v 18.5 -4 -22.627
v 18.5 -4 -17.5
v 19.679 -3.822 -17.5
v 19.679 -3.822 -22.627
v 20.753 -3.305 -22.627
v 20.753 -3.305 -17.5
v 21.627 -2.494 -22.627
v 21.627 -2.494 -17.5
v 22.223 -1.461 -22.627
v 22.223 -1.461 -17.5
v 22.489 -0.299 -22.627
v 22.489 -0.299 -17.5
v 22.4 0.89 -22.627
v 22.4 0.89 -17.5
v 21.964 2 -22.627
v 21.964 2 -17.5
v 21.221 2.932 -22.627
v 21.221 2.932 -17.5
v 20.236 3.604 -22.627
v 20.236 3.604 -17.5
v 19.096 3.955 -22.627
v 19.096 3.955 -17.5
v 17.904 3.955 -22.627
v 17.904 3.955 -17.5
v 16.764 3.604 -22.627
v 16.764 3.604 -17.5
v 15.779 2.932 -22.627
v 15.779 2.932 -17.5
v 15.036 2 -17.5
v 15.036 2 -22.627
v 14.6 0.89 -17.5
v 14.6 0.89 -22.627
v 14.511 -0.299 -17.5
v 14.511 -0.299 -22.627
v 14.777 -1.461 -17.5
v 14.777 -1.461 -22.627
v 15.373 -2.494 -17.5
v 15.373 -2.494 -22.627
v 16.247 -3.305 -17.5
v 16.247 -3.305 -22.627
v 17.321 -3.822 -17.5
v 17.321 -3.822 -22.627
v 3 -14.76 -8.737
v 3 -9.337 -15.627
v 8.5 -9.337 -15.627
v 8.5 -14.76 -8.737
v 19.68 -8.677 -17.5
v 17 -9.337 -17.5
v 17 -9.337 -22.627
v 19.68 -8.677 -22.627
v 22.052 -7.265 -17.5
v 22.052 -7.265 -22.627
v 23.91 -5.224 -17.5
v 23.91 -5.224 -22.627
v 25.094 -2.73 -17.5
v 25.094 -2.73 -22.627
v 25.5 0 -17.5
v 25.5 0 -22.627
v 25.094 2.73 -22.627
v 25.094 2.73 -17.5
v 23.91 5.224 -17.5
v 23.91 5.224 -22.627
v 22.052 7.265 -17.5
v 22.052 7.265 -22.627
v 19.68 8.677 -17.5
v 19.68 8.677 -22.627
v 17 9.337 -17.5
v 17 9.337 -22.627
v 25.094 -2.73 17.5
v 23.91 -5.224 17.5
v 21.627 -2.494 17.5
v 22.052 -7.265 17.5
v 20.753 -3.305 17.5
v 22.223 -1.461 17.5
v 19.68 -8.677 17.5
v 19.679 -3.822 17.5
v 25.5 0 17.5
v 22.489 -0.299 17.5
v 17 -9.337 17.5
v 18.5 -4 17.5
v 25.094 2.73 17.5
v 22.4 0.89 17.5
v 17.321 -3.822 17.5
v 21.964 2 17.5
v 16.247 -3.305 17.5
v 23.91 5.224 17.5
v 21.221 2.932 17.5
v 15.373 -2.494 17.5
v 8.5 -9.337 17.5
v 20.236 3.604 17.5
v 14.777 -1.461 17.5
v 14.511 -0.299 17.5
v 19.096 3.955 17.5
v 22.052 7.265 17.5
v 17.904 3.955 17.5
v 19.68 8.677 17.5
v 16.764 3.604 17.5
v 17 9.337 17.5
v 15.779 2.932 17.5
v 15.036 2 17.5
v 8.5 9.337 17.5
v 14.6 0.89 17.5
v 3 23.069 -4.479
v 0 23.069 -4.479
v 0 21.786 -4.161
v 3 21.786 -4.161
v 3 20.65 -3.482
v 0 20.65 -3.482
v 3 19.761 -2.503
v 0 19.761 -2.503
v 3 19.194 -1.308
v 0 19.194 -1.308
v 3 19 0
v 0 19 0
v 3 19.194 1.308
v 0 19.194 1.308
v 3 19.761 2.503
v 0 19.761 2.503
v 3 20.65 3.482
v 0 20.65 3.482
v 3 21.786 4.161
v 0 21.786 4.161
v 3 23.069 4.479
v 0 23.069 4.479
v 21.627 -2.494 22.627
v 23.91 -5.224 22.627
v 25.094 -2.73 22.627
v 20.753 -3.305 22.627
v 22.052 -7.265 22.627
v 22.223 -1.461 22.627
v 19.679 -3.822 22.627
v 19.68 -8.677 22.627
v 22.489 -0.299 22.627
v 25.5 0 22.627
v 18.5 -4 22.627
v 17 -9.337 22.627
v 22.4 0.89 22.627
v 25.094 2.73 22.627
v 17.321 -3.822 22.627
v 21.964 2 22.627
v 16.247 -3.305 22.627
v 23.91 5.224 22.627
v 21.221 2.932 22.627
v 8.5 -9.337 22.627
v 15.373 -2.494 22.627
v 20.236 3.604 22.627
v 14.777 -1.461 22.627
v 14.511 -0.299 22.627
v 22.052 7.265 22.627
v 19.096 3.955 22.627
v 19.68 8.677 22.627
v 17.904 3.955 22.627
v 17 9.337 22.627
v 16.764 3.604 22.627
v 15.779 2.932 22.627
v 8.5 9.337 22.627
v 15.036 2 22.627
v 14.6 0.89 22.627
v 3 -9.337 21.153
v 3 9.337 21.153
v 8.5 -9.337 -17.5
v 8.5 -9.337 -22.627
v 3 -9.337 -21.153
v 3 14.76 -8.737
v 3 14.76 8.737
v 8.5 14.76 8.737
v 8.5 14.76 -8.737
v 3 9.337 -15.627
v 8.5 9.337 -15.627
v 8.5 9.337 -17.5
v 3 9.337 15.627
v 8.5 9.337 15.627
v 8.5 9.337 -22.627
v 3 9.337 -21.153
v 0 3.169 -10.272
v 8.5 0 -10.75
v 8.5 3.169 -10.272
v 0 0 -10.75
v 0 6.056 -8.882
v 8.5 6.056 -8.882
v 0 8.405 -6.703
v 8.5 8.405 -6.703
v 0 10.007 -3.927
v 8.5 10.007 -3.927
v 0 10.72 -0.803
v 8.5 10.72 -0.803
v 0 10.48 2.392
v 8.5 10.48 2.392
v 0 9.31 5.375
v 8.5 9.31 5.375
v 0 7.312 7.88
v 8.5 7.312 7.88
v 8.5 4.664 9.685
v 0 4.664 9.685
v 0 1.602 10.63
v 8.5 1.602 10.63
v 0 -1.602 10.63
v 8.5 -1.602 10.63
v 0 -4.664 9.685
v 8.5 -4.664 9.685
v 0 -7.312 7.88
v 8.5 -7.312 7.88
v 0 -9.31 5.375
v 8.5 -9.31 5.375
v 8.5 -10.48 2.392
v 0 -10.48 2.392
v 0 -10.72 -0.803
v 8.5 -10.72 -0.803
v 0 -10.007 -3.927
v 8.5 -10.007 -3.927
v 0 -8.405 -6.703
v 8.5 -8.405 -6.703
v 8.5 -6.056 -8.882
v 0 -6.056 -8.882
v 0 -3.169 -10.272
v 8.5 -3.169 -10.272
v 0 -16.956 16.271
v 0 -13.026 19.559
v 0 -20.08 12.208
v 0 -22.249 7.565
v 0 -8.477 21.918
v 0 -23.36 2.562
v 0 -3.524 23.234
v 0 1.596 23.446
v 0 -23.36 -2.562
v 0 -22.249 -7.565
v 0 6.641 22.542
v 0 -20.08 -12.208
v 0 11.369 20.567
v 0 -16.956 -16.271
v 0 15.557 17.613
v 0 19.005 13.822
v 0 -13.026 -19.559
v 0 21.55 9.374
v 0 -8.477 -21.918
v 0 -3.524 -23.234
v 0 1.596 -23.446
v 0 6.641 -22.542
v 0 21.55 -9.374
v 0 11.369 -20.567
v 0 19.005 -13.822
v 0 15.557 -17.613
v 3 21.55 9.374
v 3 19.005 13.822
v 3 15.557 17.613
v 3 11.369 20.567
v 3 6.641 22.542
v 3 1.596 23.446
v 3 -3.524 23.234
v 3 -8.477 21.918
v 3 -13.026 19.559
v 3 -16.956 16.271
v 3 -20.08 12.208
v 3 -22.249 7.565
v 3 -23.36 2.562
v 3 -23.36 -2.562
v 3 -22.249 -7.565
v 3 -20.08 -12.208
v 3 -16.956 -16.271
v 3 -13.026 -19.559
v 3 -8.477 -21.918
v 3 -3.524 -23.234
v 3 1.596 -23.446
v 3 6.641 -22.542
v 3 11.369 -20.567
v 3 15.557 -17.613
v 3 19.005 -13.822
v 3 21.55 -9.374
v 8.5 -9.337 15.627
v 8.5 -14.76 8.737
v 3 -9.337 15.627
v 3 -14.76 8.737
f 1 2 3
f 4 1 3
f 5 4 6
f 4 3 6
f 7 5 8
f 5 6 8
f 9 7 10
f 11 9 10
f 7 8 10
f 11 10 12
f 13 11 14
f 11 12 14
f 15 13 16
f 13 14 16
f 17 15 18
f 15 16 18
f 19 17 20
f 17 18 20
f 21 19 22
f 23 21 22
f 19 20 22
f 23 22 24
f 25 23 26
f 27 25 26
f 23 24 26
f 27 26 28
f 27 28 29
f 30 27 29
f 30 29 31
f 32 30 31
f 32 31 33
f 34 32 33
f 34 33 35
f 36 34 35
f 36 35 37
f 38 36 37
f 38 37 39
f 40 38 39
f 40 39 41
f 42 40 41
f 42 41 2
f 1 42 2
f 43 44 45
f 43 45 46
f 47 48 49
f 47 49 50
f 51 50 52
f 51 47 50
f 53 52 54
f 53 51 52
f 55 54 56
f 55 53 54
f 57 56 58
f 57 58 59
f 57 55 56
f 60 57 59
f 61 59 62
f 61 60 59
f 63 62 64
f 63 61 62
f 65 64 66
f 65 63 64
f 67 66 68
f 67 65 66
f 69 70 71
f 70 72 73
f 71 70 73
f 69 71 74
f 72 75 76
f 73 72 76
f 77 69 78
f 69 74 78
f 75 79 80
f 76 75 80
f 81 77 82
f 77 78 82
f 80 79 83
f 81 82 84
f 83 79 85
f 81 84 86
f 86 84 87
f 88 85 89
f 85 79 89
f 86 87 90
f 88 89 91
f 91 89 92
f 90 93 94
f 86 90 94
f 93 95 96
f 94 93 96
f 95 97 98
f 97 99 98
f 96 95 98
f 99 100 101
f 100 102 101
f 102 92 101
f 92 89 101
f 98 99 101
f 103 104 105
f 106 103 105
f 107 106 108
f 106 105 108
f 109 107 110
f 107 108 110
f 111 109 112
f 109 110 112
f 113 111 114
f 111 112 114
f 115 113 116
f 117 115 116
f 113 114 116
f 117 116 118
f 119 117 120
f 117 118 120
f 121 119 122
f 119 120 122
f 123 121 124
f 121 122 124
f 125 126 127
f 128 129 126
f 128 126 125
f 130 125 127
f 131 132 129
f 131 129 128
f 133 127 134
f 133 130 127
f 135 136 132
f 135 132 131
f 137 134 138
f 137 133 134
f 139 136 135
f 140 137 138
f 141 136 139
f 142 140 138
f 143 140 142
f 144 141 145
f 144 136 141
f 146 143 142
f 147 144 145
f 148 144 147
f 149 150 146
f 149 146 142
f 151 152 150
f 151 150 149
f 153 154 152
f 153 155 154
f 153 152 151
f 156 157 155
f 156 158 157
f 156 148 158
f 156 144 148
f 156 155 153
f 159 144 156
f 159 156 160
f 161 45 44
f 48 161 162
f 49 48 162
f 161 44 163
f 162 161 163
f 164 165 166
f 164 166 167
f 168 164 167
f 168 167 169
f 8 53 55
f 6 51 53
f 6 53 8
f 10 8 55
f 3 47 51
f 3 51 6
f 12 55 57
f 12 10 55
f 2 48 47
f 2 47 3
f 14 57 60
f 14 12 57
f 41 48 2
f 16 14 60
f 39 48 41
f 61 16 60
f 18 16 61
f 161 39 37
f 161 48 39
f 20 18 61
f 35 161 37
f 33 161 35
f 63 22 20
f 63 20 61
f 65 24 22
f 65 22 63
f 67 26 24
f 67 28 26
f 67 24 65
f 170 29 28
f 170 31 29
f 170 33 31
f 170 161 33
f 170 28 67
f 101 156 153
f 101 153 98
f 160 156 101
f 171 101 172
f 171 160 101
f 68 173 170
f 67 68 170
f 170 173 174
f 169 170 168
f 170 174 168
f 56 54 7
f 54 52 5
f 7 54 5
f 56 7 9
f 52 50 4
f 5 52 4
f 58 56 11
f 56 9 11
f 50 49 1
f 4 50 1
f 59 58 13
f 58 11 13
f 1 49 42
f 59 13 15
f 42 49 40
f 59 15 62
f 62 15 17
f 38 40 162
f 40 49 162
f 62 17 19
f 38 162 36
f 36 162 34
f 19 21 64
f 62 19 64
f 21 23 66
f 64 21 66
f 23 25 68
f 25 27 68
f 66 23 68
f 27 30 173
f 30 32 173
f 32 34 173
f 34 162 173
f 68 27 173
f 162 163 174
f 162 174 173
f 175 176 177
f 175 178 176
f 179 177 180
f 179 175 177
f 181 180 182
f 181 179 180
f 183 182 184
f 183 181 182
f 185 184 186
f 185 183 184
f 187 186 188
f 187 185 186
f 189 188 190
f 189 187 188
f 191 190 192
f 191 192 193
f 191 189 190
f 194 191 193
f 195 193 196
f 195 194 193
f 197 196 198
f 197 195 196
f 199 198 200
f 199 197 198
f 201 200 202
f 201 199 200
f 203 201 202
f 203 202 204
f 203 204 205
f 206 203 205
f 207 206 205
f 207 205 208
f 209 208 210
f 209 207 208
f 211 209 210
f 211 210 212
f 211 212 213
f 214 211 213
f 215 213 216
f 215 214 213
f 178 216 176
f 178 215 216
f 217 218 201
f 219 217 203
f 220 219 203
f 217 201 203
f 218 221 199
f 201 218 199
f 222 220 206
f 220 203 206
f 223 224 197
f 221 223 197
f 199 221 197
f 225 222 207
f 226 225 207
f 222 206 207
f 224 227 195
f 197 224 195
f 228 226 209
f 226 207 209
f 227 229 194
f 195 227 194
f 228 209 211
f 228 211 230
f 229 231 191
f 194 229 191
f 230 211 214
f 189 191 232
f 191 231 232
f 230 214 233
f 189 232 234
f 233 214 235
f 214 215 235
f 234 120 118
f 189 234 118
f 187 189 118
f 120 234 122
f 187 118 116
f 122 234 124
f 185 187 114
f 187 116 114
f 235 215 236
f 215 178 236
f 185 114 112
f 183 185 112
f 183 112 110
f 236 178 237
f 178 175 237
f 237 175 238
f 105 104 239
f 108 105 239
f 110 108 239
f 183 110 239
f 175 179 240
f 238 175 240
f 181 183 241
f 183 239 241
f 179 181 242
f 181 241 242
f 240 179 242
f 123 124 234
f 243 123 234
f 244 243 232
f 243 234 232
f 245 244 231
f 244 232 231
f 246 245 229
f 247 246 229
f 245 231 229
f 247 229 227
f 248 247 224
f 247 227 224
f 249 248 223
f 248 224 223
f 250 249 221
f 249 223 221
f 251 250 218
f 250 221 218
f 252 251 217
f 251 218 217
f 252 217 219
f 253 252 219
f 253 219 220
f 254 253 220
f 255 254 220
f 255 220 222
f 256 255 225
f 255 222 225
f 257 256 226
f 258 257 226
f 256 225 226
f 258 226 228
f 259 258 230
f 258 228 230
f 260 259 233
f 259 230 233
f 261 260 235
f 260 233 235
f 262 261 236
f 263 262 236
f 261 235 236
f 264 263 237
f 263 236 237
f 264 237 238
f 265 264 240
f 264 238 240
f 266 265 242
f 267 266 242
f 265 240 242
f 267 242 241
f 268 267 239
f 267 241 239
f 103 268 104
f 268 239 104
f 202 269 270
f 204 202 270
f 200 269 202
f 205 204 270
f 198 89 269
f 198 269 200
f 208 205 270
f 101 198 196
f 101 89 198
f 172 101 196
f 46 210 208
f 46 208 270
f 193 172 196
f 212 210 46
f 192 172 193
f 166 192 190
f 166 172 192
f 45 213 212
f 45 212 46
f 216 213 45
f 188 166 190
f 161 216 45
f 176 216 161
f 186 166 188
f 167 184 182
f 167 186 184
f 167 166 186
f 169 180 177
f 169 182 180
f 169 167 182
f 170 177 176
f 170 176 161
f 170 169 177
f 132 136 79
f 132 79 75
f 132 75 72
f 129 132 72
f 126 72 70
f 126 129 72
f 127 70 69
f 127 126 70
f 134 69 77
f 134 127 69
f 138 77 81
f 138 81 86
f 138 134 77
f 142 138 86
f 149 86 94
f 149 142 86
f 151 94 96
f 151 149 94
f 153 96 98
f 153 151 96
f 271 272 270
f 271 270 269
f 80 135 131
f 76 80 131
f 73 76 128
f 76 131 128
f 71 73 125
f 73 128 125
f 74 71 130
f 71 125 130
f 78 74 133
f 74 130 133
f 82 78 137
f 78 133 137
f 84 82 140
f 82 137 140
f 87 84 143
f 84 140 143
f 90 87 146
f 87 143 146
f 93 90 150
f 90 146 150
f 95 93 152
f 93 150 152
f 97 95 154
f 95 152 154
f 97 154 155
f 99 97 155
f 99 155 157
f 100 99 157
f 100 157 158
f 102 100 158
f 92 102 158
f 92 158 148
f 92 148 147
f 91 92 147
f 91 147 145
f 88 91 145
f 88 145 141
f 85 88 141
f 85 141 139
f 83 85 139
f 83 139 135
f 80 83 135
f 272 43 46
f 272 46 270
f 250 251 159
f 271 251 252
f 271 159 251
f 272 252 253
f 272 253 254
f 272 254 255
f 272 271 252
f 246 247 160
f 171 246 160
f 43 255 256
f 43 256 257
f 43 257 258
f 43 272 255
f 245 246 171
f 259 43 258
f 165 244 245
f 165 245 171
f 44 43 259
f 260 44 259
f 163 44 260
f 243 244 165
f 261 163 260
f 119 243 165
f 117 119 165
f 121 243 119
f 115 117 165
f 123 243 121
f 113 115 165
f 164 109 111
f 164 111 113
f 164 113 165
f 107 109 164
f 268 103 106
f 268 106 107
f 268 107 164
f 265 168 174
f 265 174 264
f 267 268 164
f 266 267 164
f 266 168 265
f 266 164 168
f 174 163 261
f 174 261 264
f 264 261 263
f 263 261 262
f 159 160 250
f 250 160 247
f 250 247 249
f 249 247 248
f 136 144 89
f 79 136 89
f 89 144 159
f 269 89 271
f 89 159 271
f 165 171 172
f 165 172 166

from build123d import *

# Parameters (mm, degrees)
SKETCH1_R           = 10.75
BOSS_EXTRUDE1_DEPTH = 3
SKETCH2_R           = 10.75
BOSS_EXTRUDE2_DEPTH = 5.5
DRAFT5_START        = -9.337185289
DRAFT5_DEPTH        = 18.674370578
SKETCH3_W           = 5.126913696
SKETCH3_H           = 18.674370578
BOSS_EXTRUDE3_DEPTH = 17
CUT_EXTRUDE1_REACH  = 59.708
CUT_EXTRUDE2_REACH  = 59.708
SKETCH5_R           = 4


# Read off the part's stored shape, not the designer's step: Draft5
with BuildPart() as part:
    # Sketch1 → Boss-Extrude1 (new body)
    with BuildSketch(Plane(origin=(0, 0, 0), x_dir=(0, 0, -1), z_dir=(1, 0, 0))):
        with BuildLine():
            ThreePointArc((-4.479326664, 23.069148936), (0, -23.5), (4.479326664, 23.069148936))
            ThreePointArc((4.479326664, 23.069148936), (0, 19), (-4.479326664, 23.069148936))
        make_face()
        Circle(SKETCH1_R, mode=Mode.SUBTRACT)
    extrude(amount=BOSS_EXTRUDE1_DEPTH)

    # Sketch2 → Boss-Extrude2 (add)
    # profile 1 of 7: a face of its own
    with BuildSketch(Plane(origin=(3, 0, 0), x_dir=(0, 0, -1), z_dir=(1, 0, 0))):
        with BuildLine():
            Line((-15.626913696, -9.337185289), (-15.626913696, 9.337185289))
            Line((-15.626913696, 9.337185289), (-21.565411447, 9.337185289))
            ThreePointArc((-21.565411447, 9.337185289), (-22.146716975, 7.859575512), (-22.626913696, 6.346083564))
            Line((-22.626913696, 6.346083564), (-22.626913696, -6.346083564))
            ThreePointArc((-22.626913696, -6.346083564), (-22.146716975, -7.859575512), (-21.565411447, -9.337185289))
            Line((-21.565411447, -9.337185289), (-15.626913696, -9.337185289))
        make_face()
    # profile 2 of 7: a face of its own
    with BuildSketch(Plane(origin=(3, 0, 0), x_dir=(0, 0, -1), z_dir=(1, 0, 0))):
        Polygon((-15.626913696, -9.337185289), (-15.626913696, 9.337185289), (-8.736803998, 14.760144229), (8.736803998, 14.760144229), (15.626913696, 9.337185289), (15.626913696, -9.337185289), (8.736803998, -14.760144229), (-8.736803998, -14.760144229), align=None)
        Circle(SKETCH2_R, mode=Mode.SUBTRACT)
    # profile 3 of 7: a face of its own
    with BuildSketch(Plane(origin=(3, 0, 0), x_dir=(0, 0, -1), z_dir=(1, 0, 0))):
        with BuildLine():
            Line((21.565411447, 9.337185289), (15.626913696, 9.337185289))
            Line((15.626913696, 9.337185289), (15.626913696, -9.337185289))
            Line((15.626913696, -9.337185289), (21.565411447, -9.337185289))
            ThreePointArc((21.565411447, -9.337185289), (22.146716975, -7.859575512), (22.626913696, -6.346083564))
            Line((22.626913696, -6.346083564), (22.626913696, 6.346083564))
            ThreePointArc((22.626913696, 6.346083564), (22.146716975, 7.859575512), (21.565411447, 9.337185289))
        make_face()
    # profile 4 of 7: a face of its own
    with BuildSketch(Plane(origin=(3, 0, 0), x_dir=(0, 0, -1), z_dir=(1, 0, 0))):
        with BuildLine():
            ThreePointArc((-22.626913696, 6.346083564), (-22.146716975, 7.859575512), (-21.565411447, 9.337185289))
            Line((-21.565411447, 9.337185289), (-22.626913696, 9.337185289))
            Line((-22.626913696, 9.337185289), (-22.626913696, 6.346083564))
        make_face()
    # profile 5 of 7: a face of its own
    with BuildSketch(Plane(origin=(3, 0, 0), x_dir=(0, 0, -1), z_dir=(1, 0, 0))):
        with BuildLine():
            Line((-22.626913696, -9.337185289), (-21.565411447, -9.337185289))
            ThreePointArc((-21.565411447, -9.337185289), (-22.146716975, -7.859575512), (-22.626913696, -6.346083564))
            Line((-22.626913696, -6.346083564), (-22.626913696, -9.337185289))
        make_face()
    # profile 6 of 7: a face of its own
    with BuildSketch(Plane(origin=(3, 0, 0), x_dir=(0, 0, -1), z_dir=(1, 0, 0))):
        with BuildLine():
            Line((22.626913696, 9.337185289), (21.565411447, 9.337185289))
            ThreePointArc((21.565411447, 9.337185289), (22.146716975, 7.859575512), (22.626913696, 6.346083564))
            Line((22.626913696, 6.346083564), (22.626913696, 9.337185289))
        make_face()
    # profile 7 of 7: a face of its own
    with BuildSketch(Plane(origin=(3, 0, 0), x_dir=(0, 0, -1), z_dir=(1, 0, 0))):
        with BuildLine():
            ThreePointArc((22.626913696, -6.346083564), (22.146716975, -7.859575512), (21.565411447, -9.337185289))
            Line((21.565411447, -9.337185289), (22.626913696, -9.337185289))
            Line((22.626913696, -9.337185289), (22.626913696, -6.346083564))
        make_face()
    extrude(amount=BOSS_EXTRUDE2_DEPTH)

    # Draft5 outline → Draft5 (cut)
    with BuildSketch(Plane(origin=(0, 0, 0), x_dir=(1, 0, 0), z_dir=(0, 1, 0)).offset(DRAFT5_START)):
        Polygon((3, 22.626913696), (3, 21.153193137), (8.5, 22.626913696), align=None)
        Polygon((3, -21.153193137), (3, -22.626913696), (8.5, -22.626913696), align=None)
    extrude(amount=DRAFT5_DEPTH, mode=Mode.SUBTRACT)

    # Sketch3 → Boss-Extrude3 (add)
    with BuildSketch(Plane(origin=(8.5, 0, 0), x_dir=(0, 0, -1), z_dir=(1, 0, 0))):
        with Locations((-20.063456848, 0)):
            Rectangle(SKETCH3_W, SKETCH3_H)
        with Locations((20.063456848, 0)):
            Rectangle(SKETCH3_W, SKETCH3_H)
    extrude(amount=BOSS_EXTRUDE3_DEPTH)

    # Cut-Extrude1: up to this face of the body (flat: up to its plane)
    cut_extrude1_end = Plane(part.part.faces().sort_by_distance((17, 0, -22.626913696))[0])
    # Sketch4 → Cut-Extrude1 (cut, up to the picked face)
    with BuildSketch(Plane.XY.offset(22.626913696), mode=Mode.PRIVATE) as cut_extrude1_sk1:
        with BuildLine():
            Line((17, 9.337185289), (17, 12.880835783))
            Line((17, 12.880835783), (29.443712865, 12.880835783))
            Line((29.443712865, 12.880835783), (29.443712865, -13.088571654))
            Line((29.443712865, -13.088571654), (17, -13.088571654))
            Line((17, -13.088571654), (17, -9.337185289))
            ThreePointArc((17, -9.337185289), (25.5, 0), (17, 9.337185289))
        make_face()
    cut_extrude1_tool1 = split(extrude(cut_extrude1_sk1.sketch, amount=-CUT_EXTRUDE1_REACH, mode=Mode.PRIVATE), bisect_by=cut_extrude1_end, keep=Keep.BOTH, mode=Mode.PRIVATE)
    add(cut_extrude1_tool1.solids().sort_by(Axis((17.287968, 11.109011, 22.626914), (0, 0, -1)))[0], mode=Mode.SUBTRACT)

    # Cut-Extrude2: up to this face of the body (flat: up to its plane)
    cut_extrude2_end = Plane(part.part.faces().sort_by_distance((16.148390538, 0, -22.626913696))[0])
    # Sketch5 → Cut-Extrude2 (cut, up to the picked face)
    with BuildSketch(Plane.XY.offset(22.626913696), mode=Mode.PRIVATE) as cut_extrude2_sk1:
        with Locations(Location((18.5, 0, 0), (0, 0, 270))):
            Circle(SKETCH5_R)
    cut_extrude2_tool1 = split(extrude(cut_extrude2_sk1.sketch, amount=-CUT_EXTRUDE2_REACH, mode=Mode.PRIVATE), bisect_by=cut_extrude2_end, keep=Keep.BOTH, mode=Mode.PRIVATE)
    add(cut_extrude2_tool1.solids().sort_by(Axis((18.5, 0, 22.626914), (0, 0, -1)))[0], mode=Mode.SUBTRACT)


solid = part.part
